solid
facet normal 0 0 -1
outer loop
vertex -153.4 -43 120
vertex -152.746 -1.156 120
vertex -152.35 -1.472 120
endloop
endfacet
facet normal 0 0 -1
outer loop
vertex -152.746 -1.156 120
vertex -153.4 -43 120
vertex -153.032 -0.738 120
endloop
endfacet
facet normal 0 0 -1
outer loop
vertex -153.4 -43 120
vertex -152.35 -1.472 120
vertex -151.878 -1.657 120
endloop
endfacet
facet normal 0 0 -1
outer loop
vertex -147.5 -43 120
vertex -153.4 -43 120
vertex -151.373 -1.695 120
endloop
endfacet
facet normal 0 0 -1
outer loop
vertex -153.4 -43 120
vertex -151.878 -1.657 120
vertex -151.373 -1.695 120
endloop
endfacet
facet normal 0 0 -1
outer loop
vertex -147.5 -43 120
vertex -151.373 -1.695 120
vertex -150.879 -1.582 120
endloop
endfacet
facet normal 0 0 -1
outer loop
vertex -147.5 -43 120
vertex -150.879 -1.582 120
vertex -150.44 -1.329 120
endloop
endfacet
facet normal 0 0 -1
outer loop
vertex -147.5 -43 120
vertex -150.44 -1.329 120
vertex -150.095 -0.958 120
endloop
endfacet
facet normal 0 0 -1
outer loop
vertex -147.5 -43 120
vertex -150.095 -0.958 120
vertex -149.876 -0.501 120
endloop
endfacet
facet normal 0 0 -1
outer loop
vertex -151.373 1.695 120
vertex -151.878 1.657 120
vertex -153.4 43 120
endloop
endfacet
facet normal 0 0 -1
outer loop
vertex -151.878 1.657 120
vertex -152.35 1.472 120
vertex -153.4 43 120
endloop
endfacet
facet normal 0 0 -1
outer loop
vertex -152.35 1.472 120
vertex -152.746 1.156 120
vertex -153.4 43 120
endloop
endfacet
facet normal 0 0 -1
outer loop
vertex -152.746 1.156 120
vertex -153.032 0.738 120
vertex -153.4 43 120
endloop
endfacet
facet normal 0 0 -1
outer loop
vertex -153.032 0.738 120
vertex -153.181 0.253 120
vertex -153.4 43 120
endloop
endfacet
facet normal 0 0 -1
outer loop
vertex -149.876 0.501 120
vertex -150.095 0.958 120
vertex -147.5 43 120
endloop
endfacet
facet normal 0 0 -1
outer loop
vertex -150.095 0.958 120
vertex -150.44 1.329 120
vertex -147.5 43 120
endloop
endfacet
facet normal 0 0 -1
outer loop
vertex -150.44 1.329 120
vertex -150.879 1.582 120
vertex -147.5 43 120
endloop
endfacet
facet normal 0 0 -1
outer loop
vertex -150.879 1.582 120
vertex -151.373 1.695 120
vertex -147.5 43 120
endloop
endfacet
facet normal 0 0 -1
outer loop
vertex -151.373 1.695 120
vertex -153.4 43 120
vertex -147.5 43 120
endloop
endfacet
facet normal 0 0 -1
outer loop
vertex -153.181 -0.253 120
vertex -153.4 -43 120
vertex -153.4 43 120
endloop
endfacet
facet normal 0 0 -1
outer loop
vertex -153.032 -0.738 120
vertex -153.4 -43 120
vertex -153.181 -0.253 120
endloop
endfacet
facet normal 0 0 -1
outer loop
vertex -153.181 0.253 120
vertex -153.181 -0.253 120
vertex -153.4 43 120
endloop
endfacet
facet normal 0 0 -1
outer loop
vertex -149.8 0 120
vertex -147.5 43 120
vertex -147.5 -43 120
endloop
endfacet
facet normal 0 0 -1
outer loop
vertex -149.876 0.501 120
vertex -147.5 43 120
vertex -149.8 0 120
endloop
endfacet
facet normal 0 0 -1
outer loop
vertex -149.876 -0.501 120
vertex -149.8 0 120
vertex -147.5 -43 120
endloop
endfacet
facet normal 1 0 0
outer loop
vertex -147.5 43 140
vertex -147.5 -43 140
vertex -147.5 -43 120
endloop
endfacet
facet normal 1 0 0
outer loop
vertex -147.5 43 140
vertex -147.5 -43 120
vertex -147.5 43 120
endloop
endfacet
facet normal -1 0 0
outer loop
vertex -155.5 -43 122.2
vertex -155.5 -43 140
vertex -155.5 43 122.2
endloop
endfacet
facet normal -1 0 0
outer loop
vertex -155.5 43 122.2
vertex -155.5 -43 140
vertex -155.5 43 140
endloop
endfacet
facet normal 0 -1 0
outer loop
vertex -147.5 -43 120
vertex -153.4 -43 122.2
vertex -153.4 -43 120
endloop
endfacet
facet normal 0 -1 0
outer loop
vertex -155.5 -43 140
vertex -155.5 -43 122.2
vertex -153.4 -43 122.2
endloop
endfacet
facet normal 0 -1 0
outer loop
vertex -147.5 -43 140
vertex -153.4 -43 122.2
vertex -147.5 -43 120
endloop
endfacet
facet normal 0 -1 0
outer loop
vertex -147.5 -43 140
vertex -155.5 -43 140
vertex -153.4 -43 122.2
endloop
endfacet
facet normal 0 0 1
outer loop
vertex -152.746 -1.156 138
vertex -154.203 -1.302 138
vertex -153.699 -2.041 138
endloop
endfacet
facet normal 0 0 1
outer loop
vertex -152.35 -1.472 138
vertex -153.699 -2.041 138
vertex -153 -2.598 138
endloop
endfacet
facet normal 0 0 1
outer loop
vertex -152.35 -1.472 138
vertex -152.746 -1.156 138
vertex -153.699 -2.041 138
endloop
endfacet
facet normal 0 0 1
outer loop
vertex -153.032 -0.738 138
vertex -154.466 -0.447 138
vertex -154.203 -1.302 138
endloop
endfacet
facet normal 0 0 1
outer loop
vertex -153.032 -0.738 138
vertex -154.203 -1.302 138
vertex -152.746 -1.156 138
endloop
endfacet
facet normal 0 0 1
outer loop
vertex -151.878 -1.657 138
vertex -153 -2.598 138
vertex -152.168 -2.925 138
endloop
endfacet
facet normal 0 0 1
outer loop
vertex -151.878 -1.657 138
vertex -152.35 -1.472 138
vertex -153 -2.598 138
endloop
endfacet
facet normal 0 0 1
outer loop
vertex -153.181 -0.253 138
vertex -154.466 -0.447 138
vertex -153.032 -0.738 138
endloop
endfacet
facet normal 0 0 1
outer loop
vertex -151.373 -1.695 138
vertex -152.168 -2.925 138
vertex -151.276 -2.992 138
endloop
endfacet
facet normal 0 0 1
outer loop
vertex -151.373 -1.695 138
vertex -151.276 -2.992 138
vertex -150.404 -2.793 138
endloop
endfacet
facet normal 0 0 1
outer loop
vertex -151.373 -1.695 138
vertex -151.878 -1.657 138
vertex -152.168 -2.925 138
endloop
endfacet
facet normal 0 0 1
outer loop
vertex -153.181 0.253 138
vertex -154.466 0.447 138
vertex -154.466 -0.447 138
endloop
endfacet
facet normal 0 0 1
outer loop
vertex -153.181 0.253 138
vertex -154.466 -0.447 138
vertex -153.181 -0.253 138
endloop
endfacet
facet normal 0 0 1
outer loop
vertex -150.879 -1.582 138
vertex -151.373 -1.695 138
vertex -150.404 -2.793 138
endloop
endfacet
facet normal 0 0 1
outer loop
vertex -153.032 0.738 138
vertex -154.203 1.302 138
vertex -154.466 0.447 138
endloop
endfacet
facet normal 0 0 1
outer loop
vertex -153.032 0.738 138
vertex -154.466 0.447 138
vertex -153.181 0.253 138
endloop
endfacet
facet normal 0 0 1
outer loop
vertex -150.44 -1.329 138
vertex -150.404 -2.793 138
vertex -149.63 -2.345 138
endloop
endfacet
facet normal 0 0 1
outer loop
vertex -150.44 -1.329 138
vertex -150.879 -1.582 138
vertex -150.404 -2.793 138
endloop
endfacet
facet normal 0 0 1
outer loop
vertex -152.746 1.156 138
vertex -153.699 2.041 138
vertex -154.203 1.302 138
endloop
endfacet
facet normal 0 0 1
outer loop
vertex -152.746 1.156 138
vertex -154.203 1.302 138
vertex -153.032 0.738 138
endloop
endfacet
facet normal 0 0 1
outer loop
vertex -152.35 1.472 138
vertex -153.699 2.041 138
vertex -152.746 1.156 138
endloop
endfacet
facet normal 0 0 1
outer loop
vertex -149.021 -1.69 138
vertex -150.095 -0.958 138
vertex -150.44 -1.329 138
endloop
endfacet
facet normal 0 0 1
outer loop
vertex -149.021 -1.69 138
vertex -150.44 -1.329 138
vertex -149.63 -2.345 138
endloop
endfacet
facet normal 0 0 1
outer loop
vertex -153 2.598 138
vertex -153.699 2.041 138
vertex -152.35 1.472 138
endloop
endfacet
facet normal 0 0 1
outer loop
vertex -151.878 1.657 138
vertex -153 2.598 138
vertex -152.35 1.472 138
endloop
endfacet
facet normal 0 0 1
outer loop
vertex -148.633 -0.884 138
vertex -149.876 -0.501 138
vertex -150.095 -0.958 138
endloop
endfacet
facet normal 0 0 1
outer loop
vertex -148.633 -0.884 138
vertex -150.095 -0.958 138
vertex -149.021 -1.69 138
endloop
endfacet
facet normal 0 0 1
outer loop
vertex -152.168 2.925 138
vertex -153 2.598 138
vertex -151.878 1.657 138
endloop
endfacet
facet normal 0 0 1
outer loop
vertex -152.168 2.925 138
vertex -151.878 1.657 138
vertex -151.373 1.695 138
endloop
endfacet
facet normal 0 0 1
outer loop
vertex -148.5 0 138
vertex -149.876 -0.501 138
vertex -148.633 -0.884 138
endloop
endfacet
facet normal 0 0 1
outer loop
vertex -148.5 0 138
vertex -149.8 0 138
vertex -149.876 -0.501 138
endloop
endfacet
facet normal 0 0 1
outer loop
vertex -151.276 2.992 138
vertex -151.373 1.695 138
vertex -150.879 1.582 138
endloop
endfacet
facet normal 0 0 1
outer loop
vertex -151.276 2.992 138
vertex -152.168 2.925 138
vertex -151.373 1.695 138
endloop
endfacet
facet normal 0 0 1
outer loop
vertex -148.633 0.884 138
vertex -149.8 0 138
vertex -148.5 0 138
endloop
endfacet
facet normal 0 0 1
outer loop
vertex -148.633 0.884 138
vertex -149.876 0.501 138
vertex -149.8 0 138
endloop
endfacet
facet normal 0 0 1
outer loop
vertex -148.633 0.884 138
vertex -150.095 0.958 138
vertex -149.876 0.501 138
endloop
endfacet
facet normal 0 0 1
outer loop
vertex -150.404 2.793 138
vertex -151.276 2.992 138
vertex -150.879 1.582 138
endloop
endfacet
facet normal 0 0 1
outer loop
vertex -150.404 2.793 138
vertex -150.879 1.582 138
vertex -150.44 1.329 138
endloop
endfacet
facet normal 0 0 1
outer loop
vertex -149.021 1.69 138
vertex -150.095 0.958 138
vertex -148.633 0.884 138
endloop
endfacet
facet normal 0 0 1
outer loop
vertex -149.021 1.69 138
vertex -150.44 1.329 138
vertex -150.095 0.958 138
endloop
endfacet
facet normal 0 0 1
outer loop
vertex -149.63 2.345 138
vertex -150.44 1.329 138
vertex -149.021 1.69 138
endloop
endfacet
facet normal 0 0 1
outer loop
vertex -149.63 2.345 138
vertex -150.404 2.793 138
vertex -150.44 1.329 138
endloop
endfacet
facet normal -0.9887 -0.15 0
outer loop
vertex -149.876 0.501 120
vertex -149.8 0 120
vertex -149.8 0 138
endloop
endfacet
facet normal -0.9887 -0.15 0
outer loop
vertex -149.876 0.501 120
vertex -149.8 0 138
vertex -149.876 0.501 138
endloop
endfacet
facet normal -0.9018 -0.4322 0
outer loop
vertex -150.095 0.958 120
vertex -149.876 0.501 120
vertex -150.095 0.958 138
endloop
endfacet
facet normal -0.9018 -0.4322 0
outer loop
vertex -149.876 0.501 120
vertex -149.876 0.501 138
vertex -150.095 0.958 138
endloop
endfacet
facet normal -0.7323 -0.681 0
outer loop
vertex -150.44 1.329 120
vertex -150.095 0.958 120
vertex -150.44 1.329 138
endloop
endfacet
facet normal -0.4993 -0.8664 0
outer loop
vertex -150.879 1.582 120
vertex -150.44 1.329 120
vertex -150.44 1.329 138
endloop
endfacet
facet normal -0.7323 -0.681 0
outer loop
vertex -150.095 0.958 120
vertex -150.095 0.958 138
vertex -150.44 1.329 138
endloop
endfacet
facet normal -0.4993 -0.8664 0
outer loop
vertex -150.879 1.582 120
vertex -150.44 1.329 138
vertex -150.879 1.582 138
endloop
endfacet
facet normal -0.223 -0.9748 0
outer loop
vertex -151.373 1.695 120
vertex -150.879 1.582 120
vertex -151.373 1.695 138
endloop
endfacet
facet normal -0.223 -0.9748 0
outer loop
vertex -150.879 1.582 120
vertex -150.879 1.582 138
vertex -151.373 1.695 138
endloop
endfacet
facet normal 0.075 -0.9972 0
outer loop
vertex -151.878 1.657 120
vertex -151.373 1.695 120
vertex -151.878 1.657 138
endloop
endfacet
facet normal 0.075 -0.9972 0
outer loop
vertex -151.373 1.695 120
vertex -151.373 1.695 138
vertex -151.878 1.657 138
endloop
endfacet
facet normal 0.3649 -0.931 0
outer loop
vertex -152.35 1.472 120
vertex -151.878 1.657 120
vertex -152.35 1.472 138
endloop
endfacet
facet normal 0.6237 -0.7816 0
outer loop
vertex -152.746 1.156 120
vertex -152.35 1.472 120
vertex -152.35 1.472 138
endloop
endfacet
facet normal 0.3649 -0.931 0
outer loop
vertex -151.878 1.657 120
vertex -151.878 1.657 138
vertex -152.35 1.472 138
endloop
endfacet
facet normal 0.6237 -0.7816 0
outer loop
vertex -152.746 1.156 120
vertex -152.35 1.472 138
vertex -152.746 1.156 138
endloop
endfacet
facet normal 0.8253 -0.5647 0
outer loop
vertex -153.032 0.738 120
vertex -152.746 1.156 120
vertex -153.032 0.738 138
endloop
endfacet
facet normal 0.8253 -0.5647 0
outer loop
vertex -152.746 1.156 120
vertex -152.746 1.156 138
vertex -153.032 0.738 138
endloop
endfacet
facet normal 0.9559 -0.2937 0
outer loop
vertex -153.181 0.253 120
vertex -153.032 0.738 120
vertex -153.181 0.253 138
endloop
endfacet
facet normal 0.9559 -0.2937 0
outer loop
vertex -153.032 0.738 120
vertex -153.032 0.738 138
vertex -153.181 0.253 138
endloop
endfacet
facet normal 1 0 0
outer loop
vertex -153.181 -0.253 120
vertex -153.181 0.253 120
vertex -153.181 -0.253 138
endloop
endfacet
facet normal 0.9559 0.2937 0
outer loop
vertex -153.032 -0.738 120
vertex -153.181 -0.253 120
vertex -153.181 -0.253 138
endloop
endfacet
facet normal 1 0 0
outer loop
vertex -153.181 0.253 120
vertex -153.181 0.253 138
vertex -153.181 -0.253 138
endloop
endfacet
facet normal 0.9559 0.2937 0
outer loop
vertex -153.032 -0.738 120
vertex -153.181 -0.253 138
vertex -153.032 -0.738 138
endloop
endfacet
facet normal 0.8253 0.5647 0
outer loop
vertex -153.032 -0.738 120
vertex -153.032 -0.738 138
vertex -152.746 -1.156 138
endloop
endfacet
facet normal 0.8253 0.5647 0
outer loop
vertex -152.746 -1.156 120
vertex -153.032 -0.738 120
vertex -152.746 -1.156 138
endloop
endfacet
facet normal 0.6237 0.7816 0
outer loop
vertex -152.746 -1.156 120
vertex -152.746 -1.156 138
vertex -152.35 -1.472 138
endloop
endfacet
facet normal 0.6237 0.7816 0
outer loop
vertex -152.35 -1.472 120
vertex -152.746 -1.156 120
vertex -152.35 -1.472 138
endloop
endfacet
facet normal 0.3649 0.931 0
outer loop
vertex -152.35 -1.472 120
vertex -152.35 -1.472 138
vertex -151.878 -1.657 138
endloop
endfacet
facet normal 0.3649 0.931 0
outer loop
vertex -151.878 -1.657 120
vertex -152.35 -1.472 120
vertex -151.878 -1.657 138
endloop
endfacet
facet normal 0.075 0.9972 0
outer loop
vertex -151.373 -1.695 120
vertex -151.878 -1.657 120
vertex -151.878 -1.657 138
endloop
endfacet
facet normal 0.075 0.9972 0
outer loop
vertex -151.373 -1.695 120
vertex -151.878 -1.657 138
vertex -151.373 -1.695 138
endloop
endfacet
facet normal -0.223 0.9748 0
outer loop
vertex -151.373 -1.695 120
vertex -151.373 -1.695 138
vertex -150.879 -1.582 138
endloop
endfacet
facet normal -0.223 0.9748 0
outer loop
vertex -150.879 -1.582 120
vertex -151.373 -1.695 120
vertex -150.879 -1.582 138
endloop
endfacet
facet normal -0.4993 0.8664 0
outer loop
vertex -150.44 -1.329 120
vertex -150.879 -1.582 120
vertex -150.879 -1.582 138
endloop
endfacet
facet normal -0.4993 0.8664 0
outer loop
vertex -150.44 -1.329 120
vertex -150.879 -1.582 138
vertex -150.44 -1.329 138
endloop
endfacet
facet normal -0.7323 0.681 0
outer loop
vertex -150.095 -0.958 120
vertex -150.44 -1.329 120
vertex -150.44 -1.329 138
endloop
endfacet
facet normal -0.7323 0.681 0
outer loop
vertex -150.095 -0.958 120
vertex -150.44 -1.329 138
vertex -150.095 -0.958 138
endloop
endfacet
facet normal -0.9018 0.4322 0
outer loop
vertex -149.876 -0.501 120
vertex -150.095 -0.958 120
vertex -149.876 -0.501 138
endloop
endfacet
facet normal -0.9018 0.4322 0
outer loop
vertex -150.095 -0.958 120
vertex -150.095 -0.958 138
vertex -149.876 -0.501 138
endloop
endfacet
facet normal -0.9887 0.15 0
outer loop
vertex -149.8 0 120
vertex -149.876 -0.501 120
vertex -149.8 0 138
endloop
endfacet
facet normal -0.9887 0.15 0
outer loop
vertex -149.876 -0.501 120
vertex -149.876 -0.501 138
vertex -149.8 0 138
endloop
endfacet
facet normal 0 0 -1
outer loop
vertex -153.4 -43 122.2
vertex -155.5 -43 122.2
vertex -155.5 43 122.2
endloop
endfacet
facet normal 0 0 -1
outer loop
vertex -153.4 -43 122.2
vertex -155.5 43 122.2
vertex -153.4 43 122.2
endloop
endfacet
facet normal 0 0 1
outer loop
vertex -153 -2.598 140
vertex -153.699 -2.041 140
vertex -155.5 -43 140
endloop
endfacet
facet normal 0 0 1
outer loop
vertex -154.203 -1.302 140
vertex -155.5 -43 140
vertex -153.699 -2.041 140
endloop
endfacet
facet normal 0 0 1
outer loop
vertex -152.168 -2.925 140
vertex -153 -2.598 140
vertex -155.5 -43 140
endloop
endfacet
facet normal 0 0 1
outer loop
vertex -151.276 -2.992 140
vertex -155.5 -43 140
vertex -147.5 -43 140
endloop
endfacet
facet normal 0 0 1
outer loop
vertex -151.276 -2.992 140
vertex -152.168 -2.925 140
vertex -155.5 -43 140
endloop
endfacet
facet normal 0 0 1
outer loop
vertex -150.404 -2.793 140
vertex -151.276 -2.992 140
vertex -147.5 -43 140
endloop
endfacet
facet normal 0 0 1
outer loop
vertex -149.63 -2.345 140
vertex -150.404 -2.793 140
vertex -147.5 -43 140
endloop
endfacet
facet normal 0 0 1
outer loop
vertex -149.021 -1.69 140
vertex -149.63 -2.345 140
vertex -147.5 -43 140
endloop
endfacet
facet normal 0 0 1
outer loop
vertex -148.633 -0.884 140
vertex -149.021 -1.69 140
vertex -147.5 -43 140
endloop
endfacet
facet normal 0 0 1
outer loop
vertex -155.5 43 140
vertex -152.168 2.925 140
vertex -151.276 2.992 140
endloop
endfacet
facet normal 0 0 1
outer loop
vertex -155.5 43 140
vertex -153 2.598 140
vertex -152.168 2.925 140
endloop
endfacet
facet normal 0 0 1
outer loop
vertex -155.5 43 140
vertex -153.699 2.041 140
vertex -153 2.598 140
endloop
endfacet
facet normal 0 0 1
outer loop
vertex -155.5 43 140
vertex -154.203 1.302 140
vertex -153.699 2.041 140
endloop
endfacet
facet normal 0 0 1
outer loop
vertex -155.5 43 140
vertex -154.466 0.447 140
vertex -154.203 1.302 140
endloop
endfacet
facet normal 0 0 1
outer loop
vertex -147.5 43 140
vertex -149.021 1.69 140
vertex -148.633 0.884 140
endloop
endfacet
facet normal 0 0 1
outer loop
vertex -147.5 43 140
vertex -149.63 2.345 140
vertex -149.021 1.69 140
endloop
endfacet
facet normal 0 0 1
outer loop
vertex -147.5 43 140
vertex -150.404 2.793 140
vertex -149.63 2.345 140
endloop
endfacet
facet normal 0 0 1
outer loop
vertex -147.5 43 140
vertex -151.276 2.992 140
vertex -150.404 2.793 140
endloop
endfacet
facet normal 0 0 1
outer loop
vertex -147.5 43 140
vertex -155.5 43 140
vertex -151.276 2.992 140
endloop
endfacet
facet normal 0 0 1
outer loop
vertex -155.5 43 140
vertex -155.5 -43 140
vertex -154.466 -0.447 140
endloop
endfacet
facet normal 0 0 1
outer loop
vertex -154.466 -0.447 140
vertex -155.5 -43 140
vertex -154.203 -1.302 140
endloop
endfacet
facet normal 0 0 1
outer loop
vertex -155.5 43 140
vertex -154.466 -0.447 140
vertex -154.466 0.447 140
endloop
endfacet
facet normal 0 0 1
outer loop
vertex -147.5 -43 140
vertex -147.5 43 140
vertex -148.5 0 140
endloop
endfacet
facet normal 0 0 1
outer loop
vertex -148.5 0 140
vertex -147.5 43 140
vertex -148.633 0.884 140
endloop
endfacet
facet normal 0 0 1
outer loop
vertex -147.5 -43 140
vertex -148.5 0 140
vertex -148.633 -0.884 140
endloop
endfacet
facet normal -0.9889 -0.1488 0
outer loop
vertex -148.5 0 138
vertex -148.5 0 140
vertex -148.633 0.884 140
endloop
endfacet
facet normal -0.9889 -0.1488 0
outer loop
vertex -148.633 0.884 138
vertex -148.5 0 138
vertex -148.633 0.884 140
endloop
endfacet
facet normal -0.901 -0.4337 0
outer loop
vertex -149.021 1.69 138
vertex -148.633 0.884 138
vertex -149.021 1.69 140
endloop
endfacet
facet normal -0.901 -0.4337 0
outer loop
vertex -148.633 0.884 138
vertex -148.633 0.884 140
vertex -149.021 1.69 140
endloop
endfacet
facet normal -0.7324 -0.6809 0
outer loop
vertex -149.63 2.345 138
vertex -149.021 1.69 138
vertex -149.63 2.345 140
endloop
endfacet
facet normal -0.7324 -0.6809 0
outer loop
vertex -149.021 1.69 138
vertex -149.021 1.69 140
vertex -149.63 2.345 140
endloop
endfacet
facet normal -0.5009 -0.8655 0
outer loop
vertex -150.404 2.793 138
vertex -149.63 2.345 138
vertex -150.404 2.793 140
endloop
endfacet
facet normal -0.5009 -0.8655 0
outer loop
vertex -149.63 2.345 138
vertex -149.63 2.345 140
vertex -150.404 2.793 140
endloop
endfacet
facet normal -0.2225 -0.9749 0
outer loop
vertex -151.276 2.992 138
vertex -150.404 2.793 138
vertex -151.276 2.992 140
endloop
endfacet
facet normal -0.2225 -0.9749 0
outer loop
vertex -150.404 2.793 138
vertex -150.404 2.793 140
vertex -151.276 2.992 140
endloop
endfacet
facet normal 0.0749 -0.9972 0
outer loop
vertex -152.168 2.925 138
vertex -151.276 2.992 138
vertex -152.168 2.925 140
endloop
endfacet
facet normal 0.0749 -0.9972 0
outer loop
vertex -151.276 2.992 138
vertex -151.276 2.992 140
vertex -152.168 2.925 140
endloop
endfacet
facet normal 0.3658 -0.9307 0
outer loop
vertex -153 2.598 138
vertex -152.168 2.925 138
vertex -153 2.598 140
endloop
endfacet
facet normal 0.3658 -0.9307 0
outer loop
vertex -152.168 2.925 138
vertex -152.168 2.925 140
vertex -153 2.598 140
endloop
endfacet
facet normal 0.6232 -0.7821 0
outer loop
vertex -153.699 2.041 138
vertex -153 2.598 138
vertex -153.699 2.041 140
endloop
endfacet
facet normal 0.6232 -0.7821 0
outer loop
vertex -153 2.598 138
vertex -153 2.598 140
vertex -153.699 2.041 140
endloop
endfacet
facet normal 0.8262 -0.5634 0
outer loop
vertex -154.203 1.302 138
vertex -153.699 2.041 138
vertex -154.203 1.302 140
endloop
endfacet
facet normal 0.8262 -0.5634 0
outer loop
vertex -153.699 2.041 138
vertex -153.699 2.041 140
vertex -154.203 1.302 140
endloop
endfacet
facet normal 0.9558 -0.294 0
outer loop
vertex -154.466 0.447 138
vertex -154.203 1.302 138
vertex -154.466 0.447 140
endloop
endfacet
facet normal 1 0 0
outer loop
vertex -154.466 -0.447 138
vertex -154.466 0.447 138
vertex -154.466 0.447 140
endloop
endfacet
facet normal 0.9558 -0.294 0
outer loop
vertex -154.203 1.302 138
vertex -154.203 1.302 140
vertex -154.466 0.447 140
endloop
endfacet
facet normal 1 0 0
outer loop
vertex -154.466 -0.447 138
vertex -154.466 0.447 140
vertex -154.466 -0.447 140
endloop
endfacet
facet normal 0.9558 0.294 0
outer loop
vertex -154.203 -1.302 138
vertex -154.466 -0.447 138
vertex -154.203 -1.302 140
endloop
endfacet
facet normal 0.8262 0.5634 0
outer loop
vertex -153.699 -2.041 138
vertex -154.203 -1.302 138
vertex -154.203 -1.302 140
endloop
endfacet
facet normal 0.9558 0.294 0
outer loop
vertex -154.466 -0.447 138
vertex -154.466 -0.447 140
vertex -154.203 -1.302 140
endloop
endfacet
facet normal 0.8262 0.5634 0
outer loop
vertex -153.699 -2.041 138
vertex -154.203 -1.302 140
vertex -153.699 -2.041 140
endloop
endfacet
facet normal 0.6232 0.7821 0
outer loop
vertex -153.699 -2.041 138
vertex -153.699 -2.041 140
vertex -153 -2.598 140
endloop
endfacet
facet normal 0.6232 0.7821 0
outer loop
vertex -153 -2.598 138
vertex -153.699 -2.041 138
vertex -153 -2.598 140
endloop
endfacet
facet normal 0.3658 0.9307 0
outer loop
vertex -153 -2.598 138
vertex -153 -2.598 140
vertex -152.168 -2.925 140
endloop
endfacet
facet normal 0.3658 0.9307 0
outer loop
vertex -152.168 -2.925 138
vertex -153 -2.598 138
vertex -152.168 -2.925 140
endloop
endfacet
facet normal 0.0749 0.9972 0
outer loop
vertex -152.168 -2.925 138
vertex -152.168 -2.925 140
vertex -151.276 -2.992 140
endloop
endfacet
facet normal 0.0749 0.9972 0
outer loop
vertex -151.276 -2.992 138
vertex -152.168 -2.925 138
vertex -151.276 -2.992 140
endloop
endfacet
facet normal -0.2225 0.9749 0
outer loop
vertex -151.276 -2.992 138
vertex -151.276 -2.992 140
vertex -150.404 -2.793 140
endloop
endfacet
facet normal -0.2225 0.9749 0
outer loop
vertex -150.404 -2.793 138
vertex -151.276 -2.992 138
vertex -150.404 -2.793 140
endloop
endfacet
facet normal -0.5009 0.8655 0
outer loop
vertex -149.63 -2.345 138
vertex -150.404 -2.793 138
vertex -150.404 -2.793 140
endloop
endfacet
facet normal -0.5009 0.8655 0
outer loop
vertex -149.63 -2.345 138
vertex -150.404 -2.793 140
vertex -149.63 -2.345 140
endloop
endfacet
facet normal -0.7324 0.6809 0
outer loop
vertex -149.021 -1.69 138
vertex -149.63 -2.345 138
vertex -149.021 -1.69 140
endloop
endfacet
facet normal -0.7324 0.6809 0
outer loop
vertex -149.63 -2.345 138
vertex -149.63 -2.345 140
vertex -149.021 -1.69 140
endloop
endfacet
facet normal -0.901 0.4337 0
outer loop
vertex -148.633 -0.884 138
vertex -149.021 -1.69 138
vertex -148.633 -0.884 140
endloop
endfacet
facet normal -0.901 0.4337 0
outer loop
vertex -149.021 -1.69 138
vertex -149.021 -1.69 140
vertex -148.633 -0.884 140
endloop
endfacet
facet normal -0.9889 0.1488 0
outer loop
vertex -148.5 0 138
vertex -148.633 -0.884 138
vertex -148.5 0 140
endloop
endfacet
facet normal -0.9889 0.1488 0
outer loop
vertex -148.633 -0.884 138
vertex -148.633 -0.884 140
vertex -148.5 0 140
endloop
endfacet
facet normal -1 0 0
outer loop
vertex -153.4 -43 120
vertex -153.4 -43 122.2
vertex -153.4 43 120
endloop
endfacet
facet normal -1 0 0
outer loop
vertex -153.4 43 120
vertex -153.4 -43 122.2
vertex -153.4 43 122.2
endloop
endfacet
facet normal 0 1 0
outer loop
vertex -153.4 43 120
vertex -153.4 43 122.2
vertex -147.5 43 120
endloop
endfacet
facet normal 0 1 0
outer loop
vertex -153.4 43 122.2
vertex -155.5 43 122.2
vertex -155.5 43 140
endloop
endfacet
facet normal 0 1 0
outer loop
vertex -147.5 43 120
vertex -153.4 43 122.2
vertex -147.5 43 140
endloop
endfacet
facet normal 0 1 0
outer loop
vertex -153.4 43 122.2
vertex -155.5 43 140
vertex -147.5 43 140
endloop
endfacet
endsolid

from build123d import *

# Parameters (mm, degrees)
MAIN_PROFILE_SKETCH_W     = 8
MAIN_PROFILE_SKETCH_H     = 86
MAIN_PROFILE_SKETCH_R     = 3
MAIN_EXTRUSION_DEPTH      = 2
DETAIL_PROFILE_2_SKETCH_W = 8
DETAIL_PROFILE_2_SKETCH_H = 86
DETAIL_PROFILE_2_SKETCH_R = 1.7
DETAIL_EXTRUSION_2_DEPTH  = 15.8
DETAIL_PROFILE_3_SKETCH_W = 5.9
DETAIL_PROFILE_3_SKETCH_H = 86
DETAIL_PROFILE_3_SKETCH_R = 1.7
DETAIL_EXTRUSION_3_DEPTH  = 2.2


with BuildPart() as part:
    # Main Profile Sketch → Main Extrusion (new body)
    with BuildSketch(Plane.XY.offset(140)):
        with Locations((-151.5, 0)):
            Rectangle(MAIN_PROFILE_SKETCH_W, MAIN_PROFILE_SKETCH_H)
        with Locations((-151.5, 0)):
            Circle(MAIN_PROFILE_SKETCH_R, mode=Mode.SUBTRACT)
    extrude(amount=-MAIN_EXTRUSION_DEPTH)

    # Detail Profile 2 Sketch → Detail Extrusion 2 (add)
    with BuildSketch(Plane.XY.offset(138)):
        with Locations((-151.5, 0)):
            Rectangle(DETAIL_PROFILE_2_SKETCH_W, DETAIL_PROFILE_2_SKETCH_H)
        with Locations((-151.5, 0)):
            Circle(DETAIL_PROFILE_2_SKETCH_R, mode=Mode.SUBTRACT)
    extrude(amount=-DETAIL_EXTRUSION_2_DEPTH)

    # Detail Profile 3 Sketch → Detail Extrusion 3 (add)
    with BuildSketch(Plane.XY.offset(122.2)):
        with Locations((-150.45, 0)):
            Rectangle(DETAIL_PROFILE_3_SKETCH_W, DETAIL_PROFILE_3_SKETCH_H)
        with Locations((-151.5, 0)):
            Circle(DETAIL_PROFILE_3_SKETCH_R, mode=Mode.SUBTRACT)
    extrude(amount=-DETAIL_EXTRUSION_3_DEPTH)


solid = part.part
